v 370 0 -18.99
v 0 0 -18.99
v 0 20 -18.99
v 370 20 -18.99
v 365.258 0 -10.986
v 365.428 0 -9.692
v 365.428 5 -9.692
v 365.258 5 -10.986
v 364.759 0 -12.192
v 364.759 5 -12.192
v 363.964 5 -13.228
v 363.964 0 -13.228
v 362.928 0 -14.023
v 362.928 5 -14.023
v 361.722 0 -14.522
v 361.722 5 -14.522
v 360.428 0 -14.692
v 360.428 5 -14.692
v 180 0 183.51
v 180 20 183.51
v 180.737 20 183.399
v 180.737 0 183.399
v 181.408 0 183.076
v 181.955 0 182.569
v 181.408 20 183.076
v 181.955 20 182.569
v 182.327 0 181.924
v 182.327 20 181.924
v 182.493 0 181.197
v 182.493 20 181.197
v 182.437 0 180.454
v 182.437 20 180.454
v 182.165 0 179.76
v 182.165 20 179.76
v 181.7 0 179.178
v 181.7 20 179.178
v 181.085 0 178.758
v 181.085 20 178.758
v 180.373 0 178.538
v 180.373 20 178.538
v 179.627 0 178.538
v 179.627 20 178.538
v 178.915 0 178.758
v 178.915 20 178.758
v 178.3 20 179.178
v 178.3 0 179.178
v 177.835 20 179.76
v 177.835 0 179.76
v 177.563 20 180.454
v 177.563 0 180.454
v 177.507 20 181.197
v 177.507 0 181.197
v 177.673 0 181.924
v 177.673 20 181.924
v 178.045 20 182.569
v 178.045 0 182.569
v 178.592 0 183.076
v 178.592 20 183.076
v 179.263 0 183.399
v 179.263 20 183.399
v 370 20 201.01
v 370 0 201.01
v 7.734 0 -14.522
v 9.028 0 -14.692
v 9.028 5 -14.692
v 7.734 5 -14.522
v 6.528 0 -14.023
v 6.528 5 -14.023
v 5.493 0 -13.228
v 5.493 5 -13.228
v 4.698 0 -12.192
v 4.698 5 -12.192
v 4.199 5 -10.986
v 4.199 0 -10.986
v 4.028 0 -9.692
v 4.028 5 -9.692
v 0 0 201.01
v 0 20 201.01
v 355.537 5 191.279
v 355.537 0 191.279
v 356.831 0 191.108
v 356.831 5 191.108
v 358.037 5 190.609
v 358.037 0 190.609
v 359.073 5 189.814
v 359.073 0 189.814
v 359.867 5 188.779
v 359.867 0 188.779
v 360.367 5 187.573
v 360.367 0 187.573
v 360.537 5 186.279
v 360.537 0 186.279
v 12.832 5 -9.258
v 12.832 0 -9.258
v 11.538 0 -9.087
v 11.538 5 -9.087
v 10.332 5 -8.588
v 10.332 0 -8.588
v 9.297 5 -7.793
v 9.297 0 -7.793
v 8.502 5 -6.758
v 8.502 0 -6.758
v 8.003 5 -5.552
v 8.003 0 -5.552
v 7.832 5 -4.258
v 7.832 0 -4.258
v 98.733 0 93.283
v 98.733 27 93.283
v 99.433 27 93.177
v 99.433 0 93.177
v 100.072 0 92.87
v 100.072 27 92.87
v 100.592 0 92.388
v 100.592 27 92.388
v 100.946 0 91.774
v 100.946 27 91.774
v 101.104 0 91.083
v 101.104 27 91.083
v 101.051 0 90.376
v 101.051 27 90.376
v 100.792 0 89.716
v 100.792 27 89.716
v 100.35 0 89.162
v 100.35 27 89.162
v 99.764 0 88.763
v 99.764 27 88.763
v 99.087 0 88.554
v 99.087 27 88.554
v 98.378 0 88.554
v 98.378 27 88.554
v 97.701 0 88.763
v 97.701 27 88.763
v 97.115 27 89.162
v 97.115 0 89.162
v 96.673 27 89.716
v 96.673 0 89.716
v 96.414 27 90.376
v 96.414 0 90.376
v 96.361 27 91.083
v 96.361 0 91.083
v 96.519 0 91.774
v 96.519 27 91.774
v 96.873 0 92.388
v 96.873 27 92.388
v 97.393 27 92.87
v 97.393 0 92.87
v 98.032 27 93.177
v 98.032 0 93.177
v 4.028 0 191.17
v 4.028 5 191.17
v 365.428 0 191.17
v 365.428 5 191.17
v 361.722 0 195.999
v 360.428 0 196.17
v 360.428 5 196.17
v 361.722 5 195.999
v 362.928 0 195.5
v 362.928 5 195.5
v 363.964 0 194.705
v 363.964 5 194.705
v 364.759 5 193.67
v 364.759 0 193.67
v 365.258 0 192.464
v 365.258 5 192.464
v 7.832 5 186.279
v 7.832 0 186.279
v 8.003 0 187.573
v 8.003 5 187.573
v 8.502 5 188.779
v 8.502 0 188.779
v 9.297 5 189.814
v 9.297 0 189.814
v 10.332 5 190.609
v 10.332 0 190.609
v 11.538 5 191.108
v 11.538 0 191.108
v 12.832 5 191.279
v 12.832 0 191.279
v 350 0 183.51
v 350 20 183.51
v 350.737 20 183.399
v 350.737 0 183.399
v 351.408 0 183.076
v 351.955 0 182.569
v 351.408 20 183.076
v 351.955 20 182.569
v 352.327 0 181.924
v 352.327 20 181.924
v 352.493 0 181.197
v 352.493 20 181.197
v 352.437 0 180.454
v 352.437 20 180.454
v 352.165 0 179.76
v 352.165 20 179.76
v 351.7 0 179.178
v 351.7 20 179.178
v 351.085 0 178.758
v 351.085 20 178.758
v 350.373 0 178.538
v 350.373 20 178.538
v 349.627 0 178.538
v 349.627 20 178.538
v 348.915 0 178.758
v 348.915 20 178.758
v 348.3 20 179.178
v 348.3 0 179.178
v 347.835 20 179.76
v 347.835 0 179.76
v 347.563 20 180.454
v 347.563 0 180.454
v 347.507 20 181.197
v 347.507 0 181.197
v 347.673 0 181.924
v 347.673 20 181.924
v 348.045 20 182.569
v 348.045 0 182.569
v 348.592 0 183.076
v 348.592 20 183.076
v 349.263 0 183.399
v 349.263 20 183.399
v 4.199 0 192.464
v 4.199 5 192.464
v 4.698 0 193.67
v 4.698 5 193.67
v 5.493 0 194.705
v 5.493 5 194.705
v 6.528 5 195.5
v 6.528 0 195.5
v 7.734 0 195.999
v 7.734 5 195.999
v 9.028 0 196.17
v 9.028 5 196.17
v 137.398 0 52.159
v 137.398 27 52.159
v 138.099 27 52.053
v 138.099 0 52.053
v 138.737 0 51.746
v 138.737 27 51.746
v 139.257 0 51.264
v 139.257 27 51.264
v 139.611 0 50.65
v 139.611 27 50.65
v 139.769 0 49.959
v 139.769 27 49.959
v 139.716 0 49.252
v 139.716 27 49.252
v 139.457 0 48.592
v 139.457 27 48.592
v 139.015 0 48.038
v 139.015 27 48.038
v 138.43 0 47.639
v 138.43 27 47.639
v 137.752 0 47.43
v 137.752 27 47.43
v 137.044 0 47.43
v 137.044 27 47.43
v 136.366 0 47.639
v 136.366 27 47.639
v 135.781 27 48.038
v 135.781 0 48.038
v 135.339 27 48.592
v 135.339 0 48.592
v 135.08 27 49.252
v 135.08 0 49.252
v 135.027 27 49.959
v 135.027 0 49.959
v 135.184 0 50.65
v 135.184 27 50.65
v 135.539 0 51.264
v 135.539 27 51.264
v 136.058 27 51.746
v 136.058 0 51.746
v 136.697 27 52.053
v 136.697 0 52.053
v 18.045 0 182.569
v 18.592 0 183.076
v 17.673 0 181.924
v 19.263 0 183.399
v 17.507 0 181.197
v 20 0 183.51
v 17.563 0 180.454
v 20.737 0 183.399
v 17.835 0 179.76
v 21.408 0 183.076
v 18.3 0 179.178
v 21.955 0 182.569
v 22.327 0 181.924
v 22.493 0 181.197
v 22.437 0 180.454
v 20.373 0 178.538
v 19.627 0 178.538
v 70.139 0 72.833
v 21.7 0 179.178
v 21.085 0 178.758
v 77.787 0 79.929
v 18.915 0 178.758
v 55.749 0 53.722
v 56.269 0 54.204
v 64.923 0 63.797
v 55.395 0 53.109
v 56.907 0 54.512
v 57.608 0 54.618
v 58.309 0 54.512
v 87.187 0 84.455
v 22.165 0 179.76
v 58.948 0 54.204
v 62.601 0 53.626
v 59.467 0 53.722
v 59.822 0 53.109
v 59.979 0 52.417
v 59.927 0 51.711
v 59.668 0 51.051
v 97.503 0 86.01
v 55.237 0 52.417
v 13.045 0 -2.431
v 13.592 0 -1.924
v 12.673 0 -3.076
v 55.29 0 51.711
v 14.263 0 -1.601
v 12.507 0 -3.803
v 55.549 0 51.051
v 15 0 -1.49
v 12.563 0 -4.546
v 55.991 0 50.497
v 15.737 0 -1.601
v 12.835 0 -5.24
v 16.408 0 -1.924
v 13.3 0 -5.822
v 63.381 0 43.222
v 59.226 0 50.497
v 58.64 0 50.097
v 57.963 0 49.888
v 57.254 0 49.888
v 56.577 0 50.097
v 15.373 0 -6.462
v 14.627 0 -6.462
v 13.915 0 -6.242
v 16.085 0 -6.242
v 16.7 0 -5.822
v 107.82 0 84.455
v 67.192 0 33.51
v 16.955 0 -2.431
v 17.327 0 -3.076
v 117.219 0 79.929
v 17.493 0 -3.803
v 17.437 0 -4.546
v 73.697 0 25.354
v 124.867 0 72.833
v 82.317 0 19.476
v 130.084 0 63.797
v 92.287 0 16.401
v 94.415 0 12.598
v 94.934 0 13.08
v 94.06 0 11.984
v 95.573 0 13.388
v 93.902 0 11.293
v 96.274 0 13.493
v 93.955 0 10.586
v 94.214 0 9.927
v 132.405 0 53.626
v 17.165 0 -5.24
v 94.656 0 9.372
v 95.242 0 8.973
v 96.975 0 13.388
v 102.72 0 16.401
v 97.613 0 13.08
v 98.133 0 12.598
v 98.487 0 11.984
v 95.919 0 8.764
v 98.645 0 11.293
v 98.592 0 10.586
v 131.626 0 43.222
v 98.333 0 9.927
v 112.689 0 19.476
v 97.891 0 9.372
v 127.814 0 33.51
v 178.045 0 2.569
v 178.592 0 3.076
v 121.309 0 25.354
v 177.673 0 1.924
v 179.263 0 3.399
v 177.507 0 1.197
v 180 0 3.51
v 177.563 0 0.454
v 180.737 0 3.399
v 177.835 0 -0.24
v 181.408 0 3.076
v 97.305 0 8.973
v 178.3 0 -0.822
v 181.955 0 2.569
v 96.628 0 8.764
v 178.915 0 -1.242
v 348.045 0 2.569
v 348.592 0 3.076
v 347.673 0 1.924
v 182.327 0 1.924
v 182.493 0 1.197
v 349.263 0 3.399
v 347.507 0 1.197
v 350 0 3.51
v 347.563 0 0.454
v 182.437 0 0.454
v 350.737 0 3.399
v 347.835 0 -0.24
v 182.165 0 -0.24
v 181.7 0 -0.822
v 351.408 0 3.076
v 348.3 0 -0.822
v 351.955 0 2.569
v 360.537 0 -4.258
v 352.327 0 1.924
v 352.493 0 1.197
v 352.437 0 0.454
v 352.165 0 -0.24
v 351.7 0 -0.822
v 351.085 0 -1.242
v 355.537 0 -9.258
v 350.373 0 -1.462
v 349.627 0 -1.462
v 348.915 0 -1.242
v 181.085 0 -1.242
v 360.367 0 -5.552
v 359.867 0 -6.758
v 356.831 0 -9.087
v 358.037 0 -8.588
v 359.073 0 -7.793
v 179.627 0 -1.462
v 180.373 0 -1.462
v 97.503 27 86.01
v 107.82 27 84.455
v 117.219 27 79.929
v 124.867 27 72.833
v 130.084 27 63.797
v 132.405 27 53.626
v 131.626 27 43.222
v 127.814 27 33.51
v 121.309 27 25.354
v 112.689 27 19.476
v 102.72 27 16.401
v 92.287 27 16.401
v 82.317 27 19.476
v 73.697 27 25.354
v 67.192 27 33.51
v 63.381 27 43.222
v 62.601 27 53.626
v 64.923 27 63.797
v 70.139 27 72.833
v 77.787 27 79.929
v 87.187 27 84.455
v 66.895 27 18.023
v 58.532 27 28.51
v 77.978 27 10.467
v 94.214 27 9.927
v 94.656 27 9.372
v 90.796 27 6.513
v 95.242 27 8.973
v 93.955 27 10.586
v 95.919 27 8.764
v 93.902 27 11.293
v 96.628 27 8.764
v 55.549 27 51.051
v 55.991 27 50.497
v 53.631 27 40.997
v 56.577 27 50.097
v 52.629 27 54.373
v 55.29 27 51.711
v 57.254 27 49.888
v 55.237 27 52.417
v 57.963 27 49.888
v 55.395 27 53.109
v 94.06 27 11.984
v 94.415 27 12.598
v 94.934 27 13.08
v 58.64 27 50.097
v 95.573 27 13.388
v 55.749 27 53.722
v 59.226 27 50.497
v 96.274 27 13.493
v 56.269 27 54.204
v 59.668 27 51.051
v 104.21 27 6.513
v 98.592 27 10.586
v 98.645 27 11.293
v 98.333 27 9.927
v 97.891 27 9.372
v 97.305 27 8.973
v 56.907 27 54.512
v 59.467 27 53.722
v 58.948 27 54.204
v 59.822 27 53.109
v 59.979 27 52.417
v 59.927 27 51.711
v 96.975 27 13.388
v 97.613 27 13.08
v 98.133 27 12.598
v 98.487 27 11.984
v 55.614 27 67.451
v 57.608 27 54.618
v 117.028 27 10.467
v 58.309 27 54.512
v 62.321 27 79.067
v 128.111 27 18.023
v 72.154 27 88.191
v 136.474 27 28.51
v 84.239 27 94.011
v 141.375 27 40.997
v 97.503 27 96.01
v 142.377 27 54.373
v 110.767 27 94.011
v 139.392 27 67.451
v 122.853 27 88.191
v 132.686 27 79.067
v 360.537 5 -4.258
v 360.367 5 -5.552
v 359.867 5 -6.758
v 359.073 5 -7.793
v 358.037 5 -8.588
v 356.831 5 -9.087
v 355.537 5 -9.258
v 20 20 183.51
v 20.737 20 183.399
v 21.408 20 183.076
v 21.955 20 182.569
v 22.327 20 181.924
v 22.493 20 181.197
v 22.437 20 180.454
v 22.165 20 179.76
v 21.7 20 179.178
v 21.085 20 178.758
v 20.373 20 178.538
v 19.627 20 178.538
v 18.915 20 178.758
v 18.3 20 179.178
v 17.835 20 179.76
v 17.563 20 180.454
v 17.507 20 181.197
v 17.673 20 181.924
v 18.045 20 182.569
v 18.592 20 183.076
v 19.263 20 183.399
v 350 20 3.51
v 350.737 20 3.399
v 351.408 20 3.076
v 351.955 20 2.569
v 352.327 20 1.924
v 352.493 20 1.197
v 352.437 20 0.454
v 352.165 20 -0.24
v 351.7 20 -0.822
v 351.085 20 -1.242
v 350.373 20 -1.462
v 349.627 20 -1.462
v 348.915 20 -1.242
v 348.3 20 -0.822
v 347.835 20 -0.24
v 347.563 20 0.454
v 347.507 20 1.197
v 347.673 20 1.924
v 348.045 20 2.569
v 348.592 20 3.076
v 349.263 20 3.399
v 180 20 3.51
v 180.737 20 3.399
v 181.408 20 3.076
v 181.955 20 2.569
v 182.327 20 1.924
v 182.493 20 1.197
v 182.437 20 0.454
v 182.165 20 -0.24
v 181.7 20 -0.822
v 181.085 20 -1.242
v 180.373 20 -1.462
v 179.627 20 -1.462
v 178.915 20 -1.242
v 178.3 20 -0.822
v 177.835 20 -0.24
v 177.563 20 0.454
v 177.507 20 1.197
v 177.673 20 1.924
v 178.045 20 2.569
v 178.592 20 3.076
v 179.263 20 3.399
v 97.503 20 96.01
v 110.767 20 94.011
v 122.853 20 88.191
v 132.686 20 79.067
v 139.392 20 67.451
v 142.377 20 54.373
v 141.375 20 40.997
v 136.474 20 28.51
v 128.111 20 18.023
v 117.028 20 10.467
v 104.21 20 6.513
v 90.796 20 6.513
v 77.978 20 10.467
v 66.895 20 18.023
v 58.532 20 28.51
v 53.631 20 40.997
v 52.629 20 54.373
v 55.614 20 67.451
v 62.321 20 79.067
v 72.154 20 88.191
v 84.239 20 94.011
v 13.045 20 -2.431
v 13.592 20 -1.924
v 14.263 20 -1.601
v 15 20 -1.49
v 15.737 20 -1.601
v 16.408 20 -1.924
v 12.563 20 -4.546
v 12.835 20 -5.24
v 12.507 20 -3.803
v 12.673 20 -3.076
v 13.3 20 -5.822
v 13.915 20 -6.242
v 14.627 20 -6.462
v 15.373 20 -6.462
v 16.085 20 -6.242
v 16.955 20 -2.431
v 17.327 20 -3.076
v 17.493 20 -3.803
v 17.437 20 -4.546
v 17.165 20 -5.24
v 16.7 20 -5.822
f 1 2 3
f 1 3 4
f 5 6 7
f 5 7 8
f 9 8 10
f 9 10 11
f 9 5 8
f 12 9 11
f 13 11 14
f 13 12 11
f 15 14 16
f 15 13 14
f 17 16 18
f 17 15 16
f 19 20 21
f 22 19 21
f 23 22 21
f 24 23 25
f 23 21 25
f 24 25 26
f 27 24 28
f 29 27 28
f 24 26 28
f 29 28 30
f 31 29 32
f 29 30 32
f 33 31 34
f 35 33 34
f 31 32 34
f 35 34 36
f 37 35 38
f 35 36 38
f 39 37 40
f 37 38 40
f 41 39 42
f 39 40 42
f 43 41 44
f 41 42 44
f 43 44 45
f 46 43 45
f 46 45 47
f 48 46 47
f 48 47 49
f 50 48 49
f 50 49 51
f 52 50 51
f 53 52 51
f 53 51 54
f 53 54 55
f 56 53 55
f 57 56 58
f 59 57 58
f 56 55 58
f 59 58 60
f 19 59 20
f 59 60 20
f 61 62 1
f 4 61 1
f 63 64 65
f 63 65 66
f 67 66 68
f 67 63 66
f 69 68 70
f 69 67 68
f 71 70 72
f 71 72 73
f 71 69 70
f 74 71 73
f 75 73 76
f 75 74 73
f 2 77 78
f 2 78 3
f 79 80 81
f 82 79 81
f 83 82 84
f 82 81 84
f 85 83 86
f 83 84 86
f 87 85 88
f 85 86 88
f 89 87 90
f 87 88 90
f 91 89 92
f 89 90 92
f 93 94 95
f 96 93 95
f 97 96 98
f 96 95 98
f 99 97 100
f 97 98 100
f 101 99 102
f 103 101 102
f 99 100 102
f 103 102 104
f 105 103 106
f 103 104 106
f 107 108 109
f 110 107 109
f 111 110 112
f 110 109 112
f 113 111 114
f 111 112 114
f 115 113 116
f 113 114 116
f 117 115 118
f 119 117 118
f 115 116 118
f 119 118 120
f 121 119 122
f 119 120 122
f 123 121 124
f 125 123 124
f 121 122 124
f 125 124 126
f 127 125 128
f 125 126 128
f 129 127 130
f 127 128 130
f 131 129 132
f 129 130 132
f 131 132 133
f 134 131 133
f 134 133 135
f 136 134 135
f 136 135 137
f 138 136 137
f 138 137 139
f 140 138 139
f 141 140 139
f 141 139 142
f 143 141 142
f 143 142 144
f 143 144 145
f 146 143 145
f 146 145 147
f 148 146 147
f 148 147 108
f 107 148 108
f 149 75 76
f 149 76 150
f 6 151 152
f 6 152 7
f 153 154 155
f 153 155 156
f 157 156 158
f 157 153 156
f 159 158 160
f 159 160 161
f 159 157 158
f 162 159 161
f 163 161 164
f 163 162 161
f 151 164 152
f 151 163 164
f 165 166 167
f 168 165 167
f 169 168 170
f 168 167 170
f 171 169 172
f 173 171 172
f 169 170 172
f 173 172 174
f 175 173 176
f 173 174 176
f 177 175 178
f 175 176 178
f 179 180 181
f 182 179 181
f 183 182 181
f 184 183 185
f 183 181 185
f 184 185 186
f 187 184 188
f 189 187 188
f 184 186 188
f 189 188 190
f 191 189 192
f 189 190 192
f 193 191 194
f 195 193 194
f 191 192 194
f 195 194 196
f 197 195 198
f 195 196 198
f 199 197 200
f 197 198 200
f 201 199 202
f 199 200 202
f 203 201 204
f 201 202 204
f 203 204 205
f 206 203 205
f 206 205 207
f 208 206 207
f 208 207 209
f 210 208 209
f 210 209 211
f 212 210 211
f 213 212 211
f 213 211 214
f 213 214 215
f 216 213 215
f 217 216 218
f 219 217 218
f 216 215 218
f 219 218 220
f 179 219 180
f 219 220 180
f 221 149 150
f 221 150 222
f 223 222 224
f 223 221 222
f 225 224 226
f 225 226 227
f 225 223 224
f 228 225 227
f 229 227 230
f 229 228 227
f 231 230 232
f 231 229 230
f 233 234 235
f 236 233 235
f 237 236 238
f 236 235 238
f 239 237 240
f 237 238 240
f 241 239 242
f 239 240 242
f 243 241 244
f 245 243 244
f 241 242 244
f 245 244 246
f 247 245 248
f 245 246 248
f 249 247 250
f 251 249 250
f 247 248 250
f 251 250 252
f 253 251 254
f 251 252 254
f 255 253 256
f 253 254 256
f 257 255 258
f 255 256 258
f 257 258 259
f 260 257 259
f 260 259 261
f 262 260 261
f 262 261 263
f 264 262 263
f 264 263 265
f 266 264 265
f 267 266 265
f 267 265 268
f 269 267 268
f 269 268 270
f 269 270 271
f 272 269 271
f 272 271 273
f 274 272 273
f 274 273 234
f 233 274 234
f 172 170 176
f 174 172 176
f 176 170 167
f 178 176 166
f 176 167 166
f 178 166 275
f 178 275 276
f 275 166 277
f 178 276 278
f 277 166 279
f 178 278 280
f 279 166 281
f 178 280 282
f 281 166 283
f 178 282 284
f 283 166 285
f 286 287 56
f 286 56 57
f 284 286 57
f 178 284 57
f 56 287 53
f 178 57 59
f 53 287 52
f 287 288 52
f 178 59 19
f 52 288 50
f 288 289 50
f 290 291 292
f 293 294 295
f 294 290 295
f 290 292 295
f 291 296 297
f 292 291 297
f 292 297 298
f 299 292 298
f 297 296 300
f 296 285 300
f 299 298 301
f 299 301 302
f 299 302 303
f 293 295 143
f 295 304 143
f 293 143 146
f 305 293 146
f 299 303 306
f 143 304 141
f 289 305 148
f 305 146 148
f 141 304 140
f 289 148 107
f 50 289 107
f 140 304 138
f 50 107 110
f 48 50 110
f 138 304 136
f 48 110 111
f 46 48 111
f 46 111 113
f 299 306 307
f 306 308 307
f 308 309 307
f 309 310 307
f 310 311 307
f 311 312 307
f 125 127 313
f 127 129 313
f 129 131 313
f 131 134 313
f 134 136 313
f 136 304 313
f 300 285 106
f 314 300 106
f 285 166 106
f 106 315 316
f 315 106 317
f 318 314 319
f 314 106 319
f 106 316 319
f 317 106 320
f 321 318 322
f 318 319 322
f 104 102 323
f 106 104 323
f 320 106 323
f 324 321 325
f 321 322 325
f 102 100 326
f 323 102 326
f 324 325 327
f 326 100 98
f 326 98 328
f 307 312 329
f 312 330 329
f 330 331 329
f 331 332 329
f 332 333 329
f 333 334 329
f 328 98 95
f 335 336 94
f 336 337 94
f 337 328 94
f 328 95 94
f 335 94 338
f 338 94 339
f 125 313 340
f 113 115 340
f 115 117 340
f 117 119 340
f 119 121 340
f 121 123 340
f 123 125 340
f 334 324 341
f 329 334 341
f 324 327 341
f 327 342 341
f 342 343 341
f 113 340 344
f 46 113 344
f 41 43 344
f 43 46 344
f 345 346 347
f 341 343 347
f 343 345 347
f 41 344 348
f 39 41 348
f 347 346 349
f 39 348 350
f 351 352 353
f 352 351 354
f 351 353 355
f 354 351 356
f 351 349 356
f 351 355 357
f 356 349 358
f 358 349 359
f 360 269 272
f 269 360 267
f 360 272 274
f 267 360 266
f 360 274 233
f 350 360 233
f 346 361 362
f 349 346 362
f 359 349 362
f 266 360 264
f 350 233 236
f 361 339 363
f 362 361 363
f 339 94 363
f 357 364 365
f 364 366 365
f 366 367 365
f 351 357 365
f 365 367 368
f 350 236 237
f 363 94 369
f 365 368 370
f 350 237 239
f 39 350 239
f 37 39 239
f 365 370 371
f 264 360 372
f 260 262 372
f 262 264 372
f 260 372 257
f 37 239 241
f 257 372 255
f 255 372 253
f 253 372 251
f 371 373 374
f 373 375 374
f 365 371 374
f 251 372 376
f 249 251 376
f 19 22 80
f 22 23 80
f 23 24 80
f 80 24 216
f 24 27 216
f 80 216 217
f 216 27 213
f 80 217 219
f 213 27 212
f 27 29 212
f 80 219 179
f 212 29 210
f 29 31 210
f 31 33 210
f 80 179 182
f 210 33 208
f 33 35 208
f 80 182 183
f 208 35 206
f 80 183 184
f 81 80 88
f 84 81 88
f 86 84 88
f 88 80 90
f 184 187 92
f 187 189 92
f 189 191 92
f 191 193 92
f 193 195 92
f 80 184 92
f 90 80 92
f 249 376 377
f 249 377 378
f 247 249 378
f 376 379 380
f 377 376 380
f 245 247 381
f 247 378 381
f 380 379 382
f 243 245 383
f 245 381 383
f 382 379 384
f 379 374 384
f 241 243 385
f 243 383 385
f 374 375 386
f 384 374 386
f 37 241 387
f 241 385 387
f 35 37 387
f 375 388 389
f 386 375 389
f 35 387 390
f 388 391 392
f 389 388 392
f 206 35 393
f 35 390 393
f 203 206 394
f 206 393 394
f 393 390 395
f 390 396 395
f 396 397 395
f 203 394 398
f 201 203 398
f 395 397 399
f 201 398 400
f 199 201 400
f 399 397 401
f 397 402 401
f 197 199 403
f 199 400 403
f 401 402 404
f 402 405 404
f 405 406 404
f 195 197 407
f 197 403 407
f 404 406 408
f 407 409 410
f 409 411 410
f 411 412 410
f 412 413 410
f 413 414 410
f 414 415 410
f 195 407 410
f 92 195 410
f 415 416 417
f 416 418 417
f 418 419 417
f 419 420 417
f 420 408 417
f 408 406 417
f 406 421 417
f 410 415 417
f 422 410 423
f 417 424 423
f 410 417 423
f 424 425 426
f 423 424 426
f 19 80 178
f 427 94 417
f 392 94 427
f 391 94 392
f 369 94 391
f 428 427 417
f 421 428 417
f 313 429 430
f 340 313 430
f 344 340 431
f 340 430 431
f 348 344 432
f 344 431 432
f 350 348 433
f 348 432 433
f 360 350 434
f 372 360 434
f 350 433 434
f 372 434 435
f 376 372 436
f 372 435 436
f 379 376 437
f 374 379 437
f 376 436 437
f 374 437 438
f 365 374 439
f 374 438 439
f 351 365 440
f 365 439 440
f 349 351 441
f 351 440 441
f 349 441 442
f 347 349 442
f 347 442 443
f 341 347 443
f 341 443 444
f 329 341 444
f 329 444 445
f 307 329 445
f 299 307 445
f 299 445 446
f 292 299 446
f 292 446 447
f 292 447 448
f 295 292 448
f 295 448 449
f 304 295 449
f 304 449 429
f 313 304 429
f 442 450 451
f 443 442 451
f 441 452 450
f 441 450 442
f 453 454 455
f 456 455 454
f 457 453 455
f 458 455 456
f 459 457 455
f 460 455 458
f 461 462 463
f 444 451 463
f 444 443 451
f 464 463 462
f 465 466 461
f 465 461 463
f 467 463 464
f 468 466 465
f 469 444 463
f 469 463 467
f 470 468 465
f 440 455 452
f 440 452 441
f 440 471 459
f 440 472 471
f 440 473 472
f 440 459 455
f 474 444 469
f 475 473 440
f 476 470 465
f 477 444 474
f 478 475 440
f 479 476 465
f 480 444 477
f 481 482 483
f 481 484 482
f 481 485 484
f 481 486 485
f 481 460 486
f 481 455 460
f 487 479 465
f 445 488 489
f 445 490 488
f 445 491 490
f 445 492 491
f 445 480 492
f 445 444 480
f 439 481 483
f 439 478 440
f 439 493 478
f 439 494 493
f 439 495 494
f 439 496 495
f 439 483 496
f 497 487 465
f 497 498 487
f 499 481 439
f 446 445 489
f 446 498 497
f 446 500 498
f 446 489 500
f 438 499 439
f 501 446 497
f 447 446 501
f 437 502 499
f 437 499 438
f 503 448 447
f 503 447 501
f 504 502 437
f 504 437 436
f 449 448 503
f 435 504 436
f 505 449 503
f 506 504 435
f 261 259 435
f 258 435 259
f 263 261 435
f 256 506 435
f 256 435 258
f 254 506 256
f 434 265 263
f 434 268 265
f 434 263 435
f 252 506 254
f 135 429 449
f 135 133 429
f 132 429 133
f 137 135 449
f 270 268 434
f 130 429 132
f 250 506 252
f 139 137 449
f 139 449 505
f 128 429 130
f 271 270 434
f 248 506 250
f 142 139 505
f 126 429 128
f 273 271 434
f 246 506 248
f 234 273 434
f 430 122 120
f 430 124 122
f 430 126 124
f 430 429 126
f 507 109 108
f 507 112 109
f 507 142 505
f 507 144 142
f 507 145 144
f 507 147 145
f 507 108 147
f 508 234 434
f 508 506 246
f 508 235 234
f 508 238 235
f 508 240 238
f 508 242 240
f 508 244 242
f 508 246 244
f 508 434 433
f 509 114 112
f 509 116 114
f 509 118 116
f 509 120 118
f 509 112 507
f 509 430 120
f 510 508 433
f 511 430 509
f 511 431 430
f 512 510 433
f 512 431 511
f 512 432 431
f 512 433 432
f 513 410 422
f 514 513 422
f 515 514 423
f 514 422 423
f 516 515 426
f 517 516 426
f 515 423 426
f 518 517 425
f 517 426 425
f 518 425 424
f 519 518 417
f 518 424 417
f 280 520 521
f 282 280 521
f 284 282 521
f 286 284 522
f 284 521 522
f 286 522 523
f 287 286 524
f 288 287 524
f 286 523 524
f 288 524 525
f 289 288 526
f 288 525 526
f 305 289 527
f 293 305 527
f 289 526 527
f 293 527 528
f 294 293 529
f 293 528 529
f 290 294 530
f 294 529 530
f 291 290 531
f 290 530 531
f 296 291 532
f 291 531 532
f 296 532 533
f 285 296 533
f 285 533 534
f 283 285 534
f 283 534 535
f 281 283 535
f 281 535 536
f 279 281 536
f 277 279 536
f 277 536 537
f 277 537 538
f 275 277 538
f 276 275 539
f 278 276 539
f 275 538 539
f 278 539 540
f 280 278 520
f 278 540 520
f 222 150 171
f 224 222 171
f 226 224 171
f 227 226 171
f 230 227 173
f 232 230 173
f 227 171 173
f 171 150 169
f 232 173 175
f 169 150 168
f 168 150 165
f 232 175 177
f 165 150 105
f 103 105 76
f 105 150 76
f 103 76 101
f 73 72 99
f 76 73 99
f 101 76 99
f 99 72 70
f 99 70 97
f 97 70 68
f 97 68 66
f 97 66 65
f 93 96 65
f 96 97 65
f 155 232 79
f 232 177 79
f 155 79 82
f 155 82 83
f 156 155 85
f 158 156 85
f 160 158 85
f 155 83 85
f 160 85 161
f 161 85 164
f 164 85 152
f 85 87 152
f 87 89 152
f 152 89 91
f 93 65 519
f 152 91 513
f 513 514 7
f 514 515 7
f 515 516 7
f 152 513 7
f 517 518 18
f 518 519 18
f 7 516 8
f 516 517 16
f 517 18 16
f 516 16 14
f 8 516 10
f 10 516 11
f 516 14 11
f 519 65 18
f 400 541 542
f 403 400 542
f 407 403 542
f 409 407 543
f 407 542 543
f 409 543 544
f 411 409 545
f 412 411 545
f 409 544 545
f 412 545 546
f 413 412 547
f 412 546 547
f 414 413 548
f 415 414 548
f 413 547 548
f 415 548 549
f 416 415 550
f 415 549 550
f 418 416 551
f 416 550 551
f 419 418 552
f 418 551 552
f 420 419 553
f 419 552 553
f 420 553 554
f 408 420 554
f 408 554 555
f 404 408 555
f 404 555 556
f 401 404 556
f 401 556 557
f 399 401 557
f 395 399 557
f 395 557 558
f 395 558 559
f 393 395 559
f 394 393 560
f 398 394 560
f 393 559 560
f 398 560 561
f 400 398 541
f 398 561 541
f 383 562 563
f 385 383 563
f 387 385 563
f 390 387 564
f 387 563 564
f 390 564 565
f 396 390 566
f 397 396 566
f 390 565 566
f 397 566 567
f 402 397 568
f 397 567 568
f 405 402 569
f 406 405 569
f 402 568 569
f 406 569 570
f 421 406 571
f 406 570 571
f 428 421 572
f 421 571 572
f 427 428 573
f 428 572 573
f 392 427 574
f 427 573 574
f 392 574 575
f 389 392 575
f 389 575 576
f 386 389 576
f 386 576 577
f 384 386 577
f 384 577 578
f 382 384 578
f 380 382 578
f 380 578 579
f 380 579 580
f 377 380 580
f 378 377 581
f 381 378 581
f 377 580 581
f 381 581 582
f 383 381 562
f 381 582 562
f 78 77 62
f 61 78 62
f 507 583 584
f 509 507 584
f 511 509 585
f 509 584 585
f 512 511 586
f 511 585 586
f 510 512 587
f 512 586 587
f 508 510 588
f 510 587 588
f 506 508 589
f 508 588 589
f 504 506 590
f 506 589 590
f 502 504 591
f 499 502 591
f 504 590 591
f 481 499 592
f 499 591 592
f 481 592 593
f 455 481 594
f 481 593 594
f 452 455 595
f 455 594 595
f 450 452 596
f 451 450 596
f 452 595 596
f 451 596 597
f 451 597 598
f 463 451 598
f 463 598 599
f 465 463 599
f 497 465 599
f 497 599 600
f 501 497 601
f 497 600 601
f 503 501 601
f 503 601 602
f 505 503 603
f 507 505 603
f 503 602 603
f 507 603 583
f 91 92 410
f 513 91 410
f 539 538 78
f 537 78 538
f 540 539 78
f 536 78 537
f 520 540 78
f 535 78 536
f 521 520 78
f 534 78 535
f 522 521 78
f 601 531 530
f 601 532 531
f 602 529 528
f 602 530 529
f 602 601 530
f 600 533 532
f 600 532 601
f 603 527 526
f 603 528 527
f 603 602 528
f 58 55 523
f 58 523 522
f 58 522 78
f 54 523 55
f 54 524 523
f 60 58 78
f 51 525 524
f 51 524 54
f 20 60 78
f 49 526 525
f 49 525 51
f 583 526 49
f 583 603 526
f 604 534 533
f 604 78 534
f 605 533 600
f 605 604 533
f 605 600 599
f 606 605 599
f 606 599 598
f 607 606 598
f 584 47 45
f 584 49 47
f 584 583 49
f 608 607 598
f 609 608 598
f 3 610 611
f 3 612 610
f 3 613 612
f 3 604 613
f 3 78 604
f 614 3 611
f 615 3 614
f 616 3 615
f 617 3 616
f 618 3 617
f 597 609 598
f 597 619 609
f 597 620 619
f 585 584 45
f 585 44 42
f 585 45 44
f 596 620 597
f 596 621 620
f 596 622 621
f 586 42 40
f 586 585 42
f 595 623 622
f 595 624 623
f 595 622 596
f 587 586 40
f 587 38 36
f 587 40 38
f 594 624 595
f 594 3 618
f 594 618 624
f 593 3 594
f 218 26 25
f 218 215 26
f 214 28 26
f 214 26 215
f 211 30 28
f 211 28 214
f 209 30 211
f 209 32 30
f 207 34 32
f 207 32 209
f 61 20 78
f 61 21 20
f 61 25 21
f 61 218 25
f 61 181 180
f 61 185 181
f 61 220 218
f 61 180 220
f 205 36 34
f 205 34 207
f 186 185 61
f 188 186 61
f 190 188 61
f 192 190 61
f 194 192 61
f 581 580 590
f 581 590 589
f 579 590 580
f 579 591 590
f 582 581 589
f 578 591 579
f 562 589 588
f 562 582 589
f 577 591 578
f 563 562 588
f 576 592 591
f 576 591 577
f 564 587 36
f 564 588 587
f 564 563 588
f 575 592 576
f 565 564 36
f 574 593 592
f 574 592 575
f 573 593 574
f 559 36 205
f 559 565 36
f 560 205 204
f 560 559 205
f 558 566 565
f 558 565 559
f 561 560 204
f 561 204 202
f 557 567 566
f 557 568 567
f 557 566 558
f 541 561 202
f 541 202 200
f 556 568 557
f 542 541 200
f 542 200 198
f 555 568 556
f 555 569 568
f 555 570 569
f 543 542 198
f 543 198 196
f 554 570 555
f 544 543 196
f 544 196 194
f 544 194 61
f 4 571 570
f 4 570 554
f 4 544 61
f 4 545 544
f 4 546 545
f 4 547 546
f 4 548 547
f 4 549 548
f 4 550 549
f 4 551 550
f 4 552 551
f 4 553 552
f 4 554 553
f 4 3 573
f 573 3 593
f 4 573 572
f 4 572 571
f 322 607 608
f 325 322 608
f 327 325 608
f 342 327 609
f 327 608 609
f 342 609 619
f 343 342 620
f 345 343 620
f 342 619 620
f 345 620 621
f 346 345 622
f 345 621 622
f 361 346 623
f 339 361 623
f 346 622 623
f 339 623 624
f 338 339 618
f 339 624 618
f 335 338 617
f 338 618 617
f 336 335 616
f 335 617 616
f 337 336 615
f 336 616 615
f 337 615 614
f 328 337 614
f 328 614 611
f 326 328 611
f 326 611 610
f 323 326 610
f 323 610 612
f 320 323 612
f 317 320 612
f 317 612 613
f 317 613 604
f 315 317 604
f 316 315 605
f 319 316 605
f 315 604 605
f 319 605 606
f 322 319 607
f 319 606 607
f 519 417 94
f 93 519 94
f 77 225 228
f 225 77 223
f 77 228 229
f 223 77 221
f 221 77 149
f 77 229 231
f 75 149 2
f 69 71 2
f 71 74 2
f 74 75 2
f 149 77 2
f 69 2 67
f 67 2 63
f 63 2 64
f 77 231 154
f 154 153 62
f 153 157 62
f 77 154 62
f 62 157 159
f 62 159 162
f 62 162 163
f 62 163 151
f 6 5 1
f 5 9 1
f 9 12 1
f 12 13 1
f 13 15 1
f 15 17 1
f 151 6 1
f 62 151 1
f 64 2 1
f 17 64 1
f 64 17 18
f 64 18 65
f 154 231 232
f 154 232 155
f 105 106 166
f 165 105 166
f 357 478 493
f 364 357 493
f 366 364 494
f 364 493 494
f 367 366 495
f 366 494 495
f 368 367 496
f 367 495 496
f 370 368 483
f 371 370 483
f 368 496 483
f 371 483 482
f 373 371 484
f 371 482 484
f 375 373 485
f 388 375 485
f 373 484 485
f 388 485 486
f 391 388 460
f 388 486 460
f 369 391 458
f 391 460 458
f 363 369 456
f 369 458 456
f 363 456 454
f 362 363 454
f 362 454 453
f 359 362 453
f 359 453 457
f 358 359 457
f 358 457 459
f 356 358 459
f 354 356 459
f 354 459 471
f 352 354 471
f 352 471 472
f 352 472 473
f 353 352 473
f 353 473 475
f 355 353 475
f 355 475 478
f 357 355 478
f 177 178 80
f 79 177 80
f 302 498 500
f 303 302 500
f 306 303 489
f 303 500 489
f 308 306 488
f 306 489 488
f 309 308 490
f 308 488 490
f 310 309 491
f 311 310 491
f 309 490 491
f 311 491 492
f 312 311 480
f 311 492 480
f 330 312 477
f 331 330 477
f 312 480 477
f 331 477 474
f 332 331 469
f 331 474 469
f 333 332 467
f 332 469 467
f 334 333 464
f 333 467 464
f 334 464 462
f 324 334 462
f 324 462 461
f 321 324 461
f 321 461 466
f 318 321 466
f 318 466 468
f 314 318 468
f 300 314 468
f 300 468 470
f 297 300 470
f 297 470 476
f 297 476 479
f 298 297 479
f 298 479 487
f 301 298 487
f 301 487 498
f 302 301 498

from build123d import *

# Parameters (mm, degrees)
SKETCH_2_W          = 370
SKETCH_2_H          = 220
EXTRUDE_1_DEPTH     = 20
SKETCH_3_R          = 2.5
CUT_EXTRUDE_1_DEPTH = 20
CUT_EXTRUDE_2_REACH = 423.551
SKETCH_4_R          = 35
SKETCH_5_R          = 45
EXTRUDE_2_DEPTH     = 7
SKETCH_6_R          = 35
CUT_EXTRUDE_3_DEPTH = 39
SKETCH_7_R          = 2.377872616
CUT_EXTRUDE_4_DEPTH = 39
CUT_EXTRUDE_5_DEPTH = 5


with BuildPart() as part:
    # 草图2 → 凸台-拉伸1 (new body)
    with BuildSketch(Plane(origin=(0, 0, 0), x_dir=(1, 0, 0), z_dir=(0, 1, 0))):
        with Locations((185, -91.010380349)):
            Rectangle(SKETCH_2_W, SKETCH_2_H)
    extrude(amount=EXTRUDE_1_DEPTH)

    # 草图3 → 切除-拉伸1 (cut)
    with BuildSketch(Plane(origin=(0, 20, 0), x_dir=(1, 0, 0), z_dir=(0, 1, 0))):
        with Locations(Location((15, 3.989619651, 0), (0, 0, 270))):
            Circle(SKETCH_3_R)
        with Locations(Location((20, -181.010380349, 0), (0, 0, 270))):
            Circle(SKETCH_3_R)
        with Locations(Location((350, -1.010380349, 0), (0, 0, 270))):
            Circle(SKETCH_3_R)
        with Locations(Location((350, -181.010380349, 0), (0, 0, 270))):
            Circle(SKETCH_3_R)
        with Locations(Location((180, -1.010380349, 0), (0, 0, 270))):
            Circle(SKETCH_3_R)
        with Locations(Location((180, -181.010380349, 0), (0, 0, 270))):
            Circle(SKETCH_3_R)
    extrude(amount=-CUT_EXTRUDE_1_DEPTH, mode=Mode.SUBTRACT)

    # 草图4 → 切除-拉伸2 (cut, up to next)
    with BuildSketch(Plane(origin=(0, 20, 0), x_dir=(1, 0, 0), z_dir=(0, 1, 0)), mode=Mode.PRIVATE) as cut_extrude_2_sk1:
        with Locations(Location((97.503107502, -51.010380349, 0), (0, 0, 270))):
            Circle(SKETCH_4_R)
    cut_extrude_2_tool1 = extrude(cut_extrude_2_sk1.sketch, amount=-CUT_EXTRUDE_2_REACH, mode=Mode.PRIVATE) & part.part
    add(cut_extrude_2_tool1.solids().sort_by_distance((97.503108, 20, 51.01038))[0], mode=Mode.SUBTRACT)

    # 草图5 → 凸台-拉伸2 (add)
    with BuildSketch(Plane(origin=(0, 20, 0), x_dir=(1, 0, 0), z_dir=(0, 1, 0))):
        with Locations(Location((97.503107502, -51.010380349, 0), (0, 0, 270))):
            Circle(SKETCH_5_R)
    extrude(amount=EXTRUDE_2_DEPTH)

    # 草图6 → 切除-拉伸3 (cut)
    with BuildSketch(Plane(origin=(0, 27, 0), x_dir=(1, 0, 0), z_dir=(0, 1, 0))):
        with Locations(Location((97.503107502, -51.010380349, 0), (0, 0, 270))):
            Circle(SKETCH_6_R)
    extrude(amount=-CUT_EXTRUDE_3_DEPTH, mode=Mode.SUBTRACT)

    # 草图7 → 切除-拉伸4 (cut)
    with BuildSketch(Plane(origin=(0, 27, 0), x_dir=(1, 0, 0), z_dir=(0, 1, 0))):
        with Locations(Location((96.273712382, -11.115523536, 0), (0, 0, 270))):
            Circle(SKETCH_7_R)
        with Locations(Location((137.397964314, -49.78098523, 0), (0, 0, 270))):
            Circle(SKETCH_7_R)
        with Locations(Location((98.732502621, -90.905237161, 0), (0, 0, 270))):
            Circle(SKETCH_7_R)
        with Locations(Location((57.608250689, -52.239775468, 0), (0, 0, 270))):
            Circle(SKETCH_7_R)
    extrude(amount=-CUT_EXTRUDE_4_DEPTH, mode=Mode.SUBTRACT)

    # 草图9 → 切除-拉伸5 (cut)
    with BuildSketch(Plane(origin=(0, 0, 0), x_dir=(-1, 0, 0), z_dir=(0, -1, 0))):
        with BuildLine():
            Line((-9.028166447, -196.169689035), (-360.428374593, -196.169689035))
            ThreePointArc((-360.428374593, -196.169689035), (-363.963908499, -194.705222941), (-365.428374593, -191.169689035))
            Line((-365.428374593, -191.169689035), (-365.428374593, 9.692387297))
            ThreePointArc((-365.428374593, 9.692387297), (-363.963908499, 13.227921203), (-360.428374593, 14.692387297))
            Line((-360.428374593, 14.692387297), (-9.028166447, 14.692387297))
            ThreePointArc((-9.028166447, 14.692387297), (-5.492632541, 13.227921203), (-4.028166447, 9.692387297))
            Line((-4.028166447, 9.692387297), (-4.028166447, -191.169689035))
            ThreePointArc((-4.028166447, -191.169689035), (-5.492632541, -194.705222941), (-9.028166447, -196.169689035))
        make_face()
        with BuildLine():
            Line((-12.832379165, -191.278558398), (-355.537243956, -191.278558398))
            ThreePointArc((-355.537243956, -191.278558398), (-359.072777862, -189.814092304), (-360.537243956, -186.278558398))
            Line((-360.537243956, -186.278558398), (-360.537243956, 4.257797701))
            ThreePointArc((-360.537243956, 4.257797701), (-359.072777862, 7.793331607), (-355.537243956, 9.257797701))
            Line((-355.537243956, 9.257797701), (-12.832379165, 9.257797701))
            ThreePointArc((-12.832379165, 9.257797701), (-9.296845259, 7.793331607), (-7.832379165, 4.257797701))
            Line((-7.832379165, 4.257797701), (-7.832379165, -186.278558398))
            ThreePointArc((-7.832379165, -186.278558398), (-9.296845259, -189.814092304), (-12.832379165, -191.278558398))
        make_face(mode=Mode.SUBTRACT)
    extrude(amount=-CUT_EXTRUDE_5_DEPTH, mode=Mode.SUBTRACT)


solid = part.part
